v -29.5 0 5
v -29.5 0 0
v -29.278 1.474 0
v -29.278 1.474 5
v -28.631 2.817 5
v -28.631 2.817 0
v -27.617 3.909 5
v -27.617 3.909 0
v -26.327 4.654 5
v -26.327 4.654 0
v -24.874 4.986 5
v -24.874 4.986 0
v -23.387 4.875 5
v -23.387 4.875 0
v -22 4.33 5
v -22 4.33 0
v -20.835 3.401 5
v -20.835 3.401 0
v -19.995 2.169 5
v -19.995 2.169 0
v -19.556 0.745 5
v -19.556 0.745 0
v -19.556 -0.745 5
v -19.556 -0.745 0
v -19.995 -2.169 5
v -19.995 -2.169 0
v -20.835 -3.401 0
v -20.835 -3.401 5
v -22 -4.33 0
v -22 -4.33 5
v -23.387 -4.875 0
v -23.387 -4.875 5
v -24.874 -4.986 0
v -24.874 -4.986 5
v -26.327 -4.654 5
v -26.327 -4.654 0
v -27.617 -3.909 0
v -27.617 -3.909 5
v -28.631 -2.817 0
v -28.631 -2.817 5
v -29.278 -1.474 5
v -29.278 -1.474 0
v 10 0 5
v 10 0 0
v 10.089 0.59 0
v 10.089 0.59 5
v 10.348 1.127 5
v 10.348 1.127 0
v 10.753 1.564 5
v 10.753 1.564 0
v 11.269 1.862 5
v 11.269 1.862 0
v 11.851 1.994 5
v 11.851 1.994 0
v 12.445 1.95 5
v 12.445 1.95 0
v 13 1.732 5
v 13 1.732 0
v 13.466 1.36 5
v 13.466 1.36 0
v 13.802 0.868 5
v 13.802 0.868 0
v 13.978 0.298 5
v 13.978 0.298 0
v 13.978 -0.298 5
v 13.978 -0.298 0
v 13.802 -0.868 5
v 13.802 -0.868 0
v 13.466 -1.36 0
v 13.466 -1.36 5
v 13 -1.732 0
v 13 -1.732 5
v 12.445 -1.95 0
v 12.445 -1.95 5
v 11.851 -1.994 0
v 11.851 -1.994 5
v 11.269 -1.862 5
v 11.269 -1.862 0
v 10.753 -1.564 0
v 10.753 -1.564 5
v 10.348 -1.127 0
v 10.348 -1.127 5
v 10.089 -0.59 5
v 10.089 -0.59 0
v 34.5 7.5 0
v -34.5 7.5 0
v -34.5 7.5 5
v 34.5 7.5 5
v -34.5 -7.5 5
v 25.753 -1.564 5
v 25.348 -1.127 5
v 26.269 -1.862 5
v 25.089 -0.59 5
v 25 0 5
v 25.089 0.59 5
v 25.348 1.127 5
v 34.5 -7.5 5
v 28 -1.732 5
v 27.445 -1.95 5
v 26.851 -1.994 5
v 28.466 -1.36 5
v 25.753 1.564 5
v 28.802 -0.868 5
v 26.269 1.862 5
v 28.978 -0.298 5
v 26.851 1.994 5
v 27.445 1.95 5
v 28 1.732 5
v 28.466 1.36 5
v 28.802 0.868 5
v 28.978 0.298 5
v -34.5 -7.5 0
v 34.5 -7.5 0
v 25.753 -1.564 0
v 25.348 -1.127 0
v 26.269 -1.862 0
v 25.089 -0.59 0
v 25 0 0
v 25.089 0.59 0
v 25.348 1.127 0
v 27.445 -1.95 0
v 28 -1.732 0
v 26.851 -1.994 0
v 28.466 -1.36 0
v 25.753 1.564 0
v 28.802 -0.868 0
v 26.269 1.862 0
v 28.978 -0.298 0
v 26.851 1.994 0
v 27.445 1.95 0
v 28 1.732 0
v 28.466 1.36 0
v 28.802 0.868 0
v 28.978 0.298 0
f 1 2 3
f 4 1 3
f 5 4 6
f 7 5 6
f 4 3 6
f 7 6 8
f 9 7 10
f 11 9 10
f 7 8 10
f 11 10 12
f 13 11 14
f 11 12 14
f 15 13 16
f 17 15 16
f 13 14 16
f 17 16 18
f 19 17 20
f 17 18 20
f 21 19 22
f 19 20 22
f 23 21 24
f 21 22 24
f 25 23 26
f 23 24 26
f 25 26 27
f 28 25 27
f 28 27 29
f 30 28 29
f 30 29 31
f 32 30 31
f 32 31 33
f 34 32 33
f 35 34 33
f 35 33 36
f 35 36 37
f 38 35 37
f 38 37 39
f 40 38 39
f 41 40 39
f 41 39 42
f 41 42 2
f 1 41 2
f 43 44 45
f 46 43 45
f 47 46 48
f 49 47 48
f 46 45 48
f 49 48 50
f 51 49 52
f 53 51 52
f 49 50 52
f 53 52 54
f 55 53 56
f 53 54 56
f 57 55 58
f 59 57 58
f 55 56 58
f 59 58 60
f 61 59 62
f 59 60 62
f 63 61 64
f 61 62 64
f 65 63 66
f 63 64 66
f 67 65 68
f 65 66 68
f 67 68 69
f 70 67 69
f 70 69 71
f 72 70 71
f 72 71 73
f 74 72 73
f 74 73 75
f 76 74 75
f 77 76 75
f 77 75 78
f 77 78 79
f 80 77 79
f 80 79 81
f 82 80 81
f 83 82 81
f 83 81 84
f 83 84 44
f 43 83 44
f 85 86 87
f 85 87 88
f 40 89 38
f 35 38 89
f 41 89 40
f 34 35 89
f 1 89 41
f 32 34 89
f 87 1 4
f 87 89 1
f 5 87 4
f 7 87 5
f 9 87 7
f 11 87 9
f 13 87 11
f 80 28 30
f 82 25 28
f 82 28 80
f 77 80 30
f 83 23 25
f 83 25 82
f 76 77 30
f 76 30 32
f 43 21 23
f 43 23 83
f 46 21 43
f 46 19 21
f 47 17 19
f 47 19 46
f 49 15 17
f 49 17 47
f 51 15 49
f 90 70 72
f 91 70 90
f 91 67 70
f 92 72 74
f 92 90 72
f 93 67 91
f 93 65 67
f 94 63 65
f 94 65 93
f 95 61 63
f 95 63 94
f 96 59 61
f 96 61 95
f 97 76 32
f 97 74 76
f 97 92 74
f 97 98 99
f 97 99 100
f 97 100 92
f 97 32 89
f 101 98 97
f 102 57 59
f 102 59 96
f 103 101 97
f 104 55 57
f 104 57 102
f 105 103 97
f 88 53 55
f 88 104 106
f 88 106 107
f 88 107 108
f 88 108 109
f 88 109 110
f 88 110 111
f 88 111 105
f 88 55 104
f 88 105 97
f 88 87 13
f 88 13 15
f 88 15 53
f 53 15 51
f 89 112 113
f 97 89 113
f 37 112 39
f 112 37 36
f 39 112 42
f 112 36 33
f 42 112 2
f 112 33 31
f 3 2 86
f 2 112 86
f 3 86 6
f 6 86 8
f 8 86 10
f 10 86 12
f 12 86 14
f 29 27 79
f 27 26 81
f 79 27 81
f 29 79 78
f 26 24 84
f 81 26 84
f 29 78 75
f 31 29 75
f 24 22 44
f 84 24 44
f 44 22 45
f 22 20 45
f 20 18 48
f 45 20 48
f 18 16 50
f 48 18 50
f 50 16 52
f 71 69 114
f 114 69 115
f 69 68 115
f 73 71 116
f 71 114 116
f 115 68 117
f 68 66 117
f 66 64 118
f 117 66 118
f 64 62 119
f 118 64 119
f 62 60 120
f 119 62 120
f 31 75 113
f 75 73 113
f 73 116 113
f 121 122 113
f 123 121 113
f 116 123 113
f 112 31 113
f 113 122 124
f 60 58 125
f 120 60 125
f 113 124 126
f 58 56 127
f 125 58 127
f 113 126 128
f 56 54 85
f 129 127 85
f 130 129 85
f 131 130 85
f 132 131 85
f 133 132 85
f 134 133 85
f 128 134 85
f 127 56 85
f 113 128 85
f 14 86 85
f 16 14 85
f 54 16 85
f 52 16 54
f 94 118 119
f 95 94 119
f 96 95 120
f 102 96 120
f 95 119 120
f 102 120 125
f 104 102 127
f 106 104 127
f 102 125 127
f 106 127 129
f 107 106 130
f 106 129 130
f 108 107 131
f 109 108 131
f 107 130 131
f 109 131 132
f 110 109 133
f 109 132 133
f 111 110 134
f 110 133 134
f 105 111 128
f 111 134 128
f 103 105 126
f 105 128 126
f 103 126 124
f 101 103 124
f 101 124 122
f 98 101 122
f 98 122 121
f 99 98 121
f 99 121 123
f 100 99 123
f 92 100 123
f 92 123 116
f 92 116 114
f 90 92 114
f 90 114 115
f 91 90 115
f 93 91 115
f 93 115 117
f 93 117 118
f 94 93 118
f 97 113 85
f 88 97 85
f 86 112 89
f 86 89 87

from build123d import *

# Parameters (mm, degrees)
F0_W     = 69
F0_H     = 15
F1_DEPTH = 5
F3_D     = 10
F5_D     = 4


with BuildPart() as f1:
    # F0 (on Top) → F1 (new body)
    with BuildSketch(Plane.XY):
        Rectangle(F0_W, F0_H)
    extrude(amount=F1_DEPTH)

    # F3 (through all)
    with Locations(Plane.XY.offset(5)):
        with Locations((-24.5, 0)):
            Hole(F3_D / 2)

    # F5 (through all)
    with Locations(Plane.XY.offset(5)):
        with Locations((12, 0), (27, 0)):
            Hole(F5_D / 2)


solid = f1.part
